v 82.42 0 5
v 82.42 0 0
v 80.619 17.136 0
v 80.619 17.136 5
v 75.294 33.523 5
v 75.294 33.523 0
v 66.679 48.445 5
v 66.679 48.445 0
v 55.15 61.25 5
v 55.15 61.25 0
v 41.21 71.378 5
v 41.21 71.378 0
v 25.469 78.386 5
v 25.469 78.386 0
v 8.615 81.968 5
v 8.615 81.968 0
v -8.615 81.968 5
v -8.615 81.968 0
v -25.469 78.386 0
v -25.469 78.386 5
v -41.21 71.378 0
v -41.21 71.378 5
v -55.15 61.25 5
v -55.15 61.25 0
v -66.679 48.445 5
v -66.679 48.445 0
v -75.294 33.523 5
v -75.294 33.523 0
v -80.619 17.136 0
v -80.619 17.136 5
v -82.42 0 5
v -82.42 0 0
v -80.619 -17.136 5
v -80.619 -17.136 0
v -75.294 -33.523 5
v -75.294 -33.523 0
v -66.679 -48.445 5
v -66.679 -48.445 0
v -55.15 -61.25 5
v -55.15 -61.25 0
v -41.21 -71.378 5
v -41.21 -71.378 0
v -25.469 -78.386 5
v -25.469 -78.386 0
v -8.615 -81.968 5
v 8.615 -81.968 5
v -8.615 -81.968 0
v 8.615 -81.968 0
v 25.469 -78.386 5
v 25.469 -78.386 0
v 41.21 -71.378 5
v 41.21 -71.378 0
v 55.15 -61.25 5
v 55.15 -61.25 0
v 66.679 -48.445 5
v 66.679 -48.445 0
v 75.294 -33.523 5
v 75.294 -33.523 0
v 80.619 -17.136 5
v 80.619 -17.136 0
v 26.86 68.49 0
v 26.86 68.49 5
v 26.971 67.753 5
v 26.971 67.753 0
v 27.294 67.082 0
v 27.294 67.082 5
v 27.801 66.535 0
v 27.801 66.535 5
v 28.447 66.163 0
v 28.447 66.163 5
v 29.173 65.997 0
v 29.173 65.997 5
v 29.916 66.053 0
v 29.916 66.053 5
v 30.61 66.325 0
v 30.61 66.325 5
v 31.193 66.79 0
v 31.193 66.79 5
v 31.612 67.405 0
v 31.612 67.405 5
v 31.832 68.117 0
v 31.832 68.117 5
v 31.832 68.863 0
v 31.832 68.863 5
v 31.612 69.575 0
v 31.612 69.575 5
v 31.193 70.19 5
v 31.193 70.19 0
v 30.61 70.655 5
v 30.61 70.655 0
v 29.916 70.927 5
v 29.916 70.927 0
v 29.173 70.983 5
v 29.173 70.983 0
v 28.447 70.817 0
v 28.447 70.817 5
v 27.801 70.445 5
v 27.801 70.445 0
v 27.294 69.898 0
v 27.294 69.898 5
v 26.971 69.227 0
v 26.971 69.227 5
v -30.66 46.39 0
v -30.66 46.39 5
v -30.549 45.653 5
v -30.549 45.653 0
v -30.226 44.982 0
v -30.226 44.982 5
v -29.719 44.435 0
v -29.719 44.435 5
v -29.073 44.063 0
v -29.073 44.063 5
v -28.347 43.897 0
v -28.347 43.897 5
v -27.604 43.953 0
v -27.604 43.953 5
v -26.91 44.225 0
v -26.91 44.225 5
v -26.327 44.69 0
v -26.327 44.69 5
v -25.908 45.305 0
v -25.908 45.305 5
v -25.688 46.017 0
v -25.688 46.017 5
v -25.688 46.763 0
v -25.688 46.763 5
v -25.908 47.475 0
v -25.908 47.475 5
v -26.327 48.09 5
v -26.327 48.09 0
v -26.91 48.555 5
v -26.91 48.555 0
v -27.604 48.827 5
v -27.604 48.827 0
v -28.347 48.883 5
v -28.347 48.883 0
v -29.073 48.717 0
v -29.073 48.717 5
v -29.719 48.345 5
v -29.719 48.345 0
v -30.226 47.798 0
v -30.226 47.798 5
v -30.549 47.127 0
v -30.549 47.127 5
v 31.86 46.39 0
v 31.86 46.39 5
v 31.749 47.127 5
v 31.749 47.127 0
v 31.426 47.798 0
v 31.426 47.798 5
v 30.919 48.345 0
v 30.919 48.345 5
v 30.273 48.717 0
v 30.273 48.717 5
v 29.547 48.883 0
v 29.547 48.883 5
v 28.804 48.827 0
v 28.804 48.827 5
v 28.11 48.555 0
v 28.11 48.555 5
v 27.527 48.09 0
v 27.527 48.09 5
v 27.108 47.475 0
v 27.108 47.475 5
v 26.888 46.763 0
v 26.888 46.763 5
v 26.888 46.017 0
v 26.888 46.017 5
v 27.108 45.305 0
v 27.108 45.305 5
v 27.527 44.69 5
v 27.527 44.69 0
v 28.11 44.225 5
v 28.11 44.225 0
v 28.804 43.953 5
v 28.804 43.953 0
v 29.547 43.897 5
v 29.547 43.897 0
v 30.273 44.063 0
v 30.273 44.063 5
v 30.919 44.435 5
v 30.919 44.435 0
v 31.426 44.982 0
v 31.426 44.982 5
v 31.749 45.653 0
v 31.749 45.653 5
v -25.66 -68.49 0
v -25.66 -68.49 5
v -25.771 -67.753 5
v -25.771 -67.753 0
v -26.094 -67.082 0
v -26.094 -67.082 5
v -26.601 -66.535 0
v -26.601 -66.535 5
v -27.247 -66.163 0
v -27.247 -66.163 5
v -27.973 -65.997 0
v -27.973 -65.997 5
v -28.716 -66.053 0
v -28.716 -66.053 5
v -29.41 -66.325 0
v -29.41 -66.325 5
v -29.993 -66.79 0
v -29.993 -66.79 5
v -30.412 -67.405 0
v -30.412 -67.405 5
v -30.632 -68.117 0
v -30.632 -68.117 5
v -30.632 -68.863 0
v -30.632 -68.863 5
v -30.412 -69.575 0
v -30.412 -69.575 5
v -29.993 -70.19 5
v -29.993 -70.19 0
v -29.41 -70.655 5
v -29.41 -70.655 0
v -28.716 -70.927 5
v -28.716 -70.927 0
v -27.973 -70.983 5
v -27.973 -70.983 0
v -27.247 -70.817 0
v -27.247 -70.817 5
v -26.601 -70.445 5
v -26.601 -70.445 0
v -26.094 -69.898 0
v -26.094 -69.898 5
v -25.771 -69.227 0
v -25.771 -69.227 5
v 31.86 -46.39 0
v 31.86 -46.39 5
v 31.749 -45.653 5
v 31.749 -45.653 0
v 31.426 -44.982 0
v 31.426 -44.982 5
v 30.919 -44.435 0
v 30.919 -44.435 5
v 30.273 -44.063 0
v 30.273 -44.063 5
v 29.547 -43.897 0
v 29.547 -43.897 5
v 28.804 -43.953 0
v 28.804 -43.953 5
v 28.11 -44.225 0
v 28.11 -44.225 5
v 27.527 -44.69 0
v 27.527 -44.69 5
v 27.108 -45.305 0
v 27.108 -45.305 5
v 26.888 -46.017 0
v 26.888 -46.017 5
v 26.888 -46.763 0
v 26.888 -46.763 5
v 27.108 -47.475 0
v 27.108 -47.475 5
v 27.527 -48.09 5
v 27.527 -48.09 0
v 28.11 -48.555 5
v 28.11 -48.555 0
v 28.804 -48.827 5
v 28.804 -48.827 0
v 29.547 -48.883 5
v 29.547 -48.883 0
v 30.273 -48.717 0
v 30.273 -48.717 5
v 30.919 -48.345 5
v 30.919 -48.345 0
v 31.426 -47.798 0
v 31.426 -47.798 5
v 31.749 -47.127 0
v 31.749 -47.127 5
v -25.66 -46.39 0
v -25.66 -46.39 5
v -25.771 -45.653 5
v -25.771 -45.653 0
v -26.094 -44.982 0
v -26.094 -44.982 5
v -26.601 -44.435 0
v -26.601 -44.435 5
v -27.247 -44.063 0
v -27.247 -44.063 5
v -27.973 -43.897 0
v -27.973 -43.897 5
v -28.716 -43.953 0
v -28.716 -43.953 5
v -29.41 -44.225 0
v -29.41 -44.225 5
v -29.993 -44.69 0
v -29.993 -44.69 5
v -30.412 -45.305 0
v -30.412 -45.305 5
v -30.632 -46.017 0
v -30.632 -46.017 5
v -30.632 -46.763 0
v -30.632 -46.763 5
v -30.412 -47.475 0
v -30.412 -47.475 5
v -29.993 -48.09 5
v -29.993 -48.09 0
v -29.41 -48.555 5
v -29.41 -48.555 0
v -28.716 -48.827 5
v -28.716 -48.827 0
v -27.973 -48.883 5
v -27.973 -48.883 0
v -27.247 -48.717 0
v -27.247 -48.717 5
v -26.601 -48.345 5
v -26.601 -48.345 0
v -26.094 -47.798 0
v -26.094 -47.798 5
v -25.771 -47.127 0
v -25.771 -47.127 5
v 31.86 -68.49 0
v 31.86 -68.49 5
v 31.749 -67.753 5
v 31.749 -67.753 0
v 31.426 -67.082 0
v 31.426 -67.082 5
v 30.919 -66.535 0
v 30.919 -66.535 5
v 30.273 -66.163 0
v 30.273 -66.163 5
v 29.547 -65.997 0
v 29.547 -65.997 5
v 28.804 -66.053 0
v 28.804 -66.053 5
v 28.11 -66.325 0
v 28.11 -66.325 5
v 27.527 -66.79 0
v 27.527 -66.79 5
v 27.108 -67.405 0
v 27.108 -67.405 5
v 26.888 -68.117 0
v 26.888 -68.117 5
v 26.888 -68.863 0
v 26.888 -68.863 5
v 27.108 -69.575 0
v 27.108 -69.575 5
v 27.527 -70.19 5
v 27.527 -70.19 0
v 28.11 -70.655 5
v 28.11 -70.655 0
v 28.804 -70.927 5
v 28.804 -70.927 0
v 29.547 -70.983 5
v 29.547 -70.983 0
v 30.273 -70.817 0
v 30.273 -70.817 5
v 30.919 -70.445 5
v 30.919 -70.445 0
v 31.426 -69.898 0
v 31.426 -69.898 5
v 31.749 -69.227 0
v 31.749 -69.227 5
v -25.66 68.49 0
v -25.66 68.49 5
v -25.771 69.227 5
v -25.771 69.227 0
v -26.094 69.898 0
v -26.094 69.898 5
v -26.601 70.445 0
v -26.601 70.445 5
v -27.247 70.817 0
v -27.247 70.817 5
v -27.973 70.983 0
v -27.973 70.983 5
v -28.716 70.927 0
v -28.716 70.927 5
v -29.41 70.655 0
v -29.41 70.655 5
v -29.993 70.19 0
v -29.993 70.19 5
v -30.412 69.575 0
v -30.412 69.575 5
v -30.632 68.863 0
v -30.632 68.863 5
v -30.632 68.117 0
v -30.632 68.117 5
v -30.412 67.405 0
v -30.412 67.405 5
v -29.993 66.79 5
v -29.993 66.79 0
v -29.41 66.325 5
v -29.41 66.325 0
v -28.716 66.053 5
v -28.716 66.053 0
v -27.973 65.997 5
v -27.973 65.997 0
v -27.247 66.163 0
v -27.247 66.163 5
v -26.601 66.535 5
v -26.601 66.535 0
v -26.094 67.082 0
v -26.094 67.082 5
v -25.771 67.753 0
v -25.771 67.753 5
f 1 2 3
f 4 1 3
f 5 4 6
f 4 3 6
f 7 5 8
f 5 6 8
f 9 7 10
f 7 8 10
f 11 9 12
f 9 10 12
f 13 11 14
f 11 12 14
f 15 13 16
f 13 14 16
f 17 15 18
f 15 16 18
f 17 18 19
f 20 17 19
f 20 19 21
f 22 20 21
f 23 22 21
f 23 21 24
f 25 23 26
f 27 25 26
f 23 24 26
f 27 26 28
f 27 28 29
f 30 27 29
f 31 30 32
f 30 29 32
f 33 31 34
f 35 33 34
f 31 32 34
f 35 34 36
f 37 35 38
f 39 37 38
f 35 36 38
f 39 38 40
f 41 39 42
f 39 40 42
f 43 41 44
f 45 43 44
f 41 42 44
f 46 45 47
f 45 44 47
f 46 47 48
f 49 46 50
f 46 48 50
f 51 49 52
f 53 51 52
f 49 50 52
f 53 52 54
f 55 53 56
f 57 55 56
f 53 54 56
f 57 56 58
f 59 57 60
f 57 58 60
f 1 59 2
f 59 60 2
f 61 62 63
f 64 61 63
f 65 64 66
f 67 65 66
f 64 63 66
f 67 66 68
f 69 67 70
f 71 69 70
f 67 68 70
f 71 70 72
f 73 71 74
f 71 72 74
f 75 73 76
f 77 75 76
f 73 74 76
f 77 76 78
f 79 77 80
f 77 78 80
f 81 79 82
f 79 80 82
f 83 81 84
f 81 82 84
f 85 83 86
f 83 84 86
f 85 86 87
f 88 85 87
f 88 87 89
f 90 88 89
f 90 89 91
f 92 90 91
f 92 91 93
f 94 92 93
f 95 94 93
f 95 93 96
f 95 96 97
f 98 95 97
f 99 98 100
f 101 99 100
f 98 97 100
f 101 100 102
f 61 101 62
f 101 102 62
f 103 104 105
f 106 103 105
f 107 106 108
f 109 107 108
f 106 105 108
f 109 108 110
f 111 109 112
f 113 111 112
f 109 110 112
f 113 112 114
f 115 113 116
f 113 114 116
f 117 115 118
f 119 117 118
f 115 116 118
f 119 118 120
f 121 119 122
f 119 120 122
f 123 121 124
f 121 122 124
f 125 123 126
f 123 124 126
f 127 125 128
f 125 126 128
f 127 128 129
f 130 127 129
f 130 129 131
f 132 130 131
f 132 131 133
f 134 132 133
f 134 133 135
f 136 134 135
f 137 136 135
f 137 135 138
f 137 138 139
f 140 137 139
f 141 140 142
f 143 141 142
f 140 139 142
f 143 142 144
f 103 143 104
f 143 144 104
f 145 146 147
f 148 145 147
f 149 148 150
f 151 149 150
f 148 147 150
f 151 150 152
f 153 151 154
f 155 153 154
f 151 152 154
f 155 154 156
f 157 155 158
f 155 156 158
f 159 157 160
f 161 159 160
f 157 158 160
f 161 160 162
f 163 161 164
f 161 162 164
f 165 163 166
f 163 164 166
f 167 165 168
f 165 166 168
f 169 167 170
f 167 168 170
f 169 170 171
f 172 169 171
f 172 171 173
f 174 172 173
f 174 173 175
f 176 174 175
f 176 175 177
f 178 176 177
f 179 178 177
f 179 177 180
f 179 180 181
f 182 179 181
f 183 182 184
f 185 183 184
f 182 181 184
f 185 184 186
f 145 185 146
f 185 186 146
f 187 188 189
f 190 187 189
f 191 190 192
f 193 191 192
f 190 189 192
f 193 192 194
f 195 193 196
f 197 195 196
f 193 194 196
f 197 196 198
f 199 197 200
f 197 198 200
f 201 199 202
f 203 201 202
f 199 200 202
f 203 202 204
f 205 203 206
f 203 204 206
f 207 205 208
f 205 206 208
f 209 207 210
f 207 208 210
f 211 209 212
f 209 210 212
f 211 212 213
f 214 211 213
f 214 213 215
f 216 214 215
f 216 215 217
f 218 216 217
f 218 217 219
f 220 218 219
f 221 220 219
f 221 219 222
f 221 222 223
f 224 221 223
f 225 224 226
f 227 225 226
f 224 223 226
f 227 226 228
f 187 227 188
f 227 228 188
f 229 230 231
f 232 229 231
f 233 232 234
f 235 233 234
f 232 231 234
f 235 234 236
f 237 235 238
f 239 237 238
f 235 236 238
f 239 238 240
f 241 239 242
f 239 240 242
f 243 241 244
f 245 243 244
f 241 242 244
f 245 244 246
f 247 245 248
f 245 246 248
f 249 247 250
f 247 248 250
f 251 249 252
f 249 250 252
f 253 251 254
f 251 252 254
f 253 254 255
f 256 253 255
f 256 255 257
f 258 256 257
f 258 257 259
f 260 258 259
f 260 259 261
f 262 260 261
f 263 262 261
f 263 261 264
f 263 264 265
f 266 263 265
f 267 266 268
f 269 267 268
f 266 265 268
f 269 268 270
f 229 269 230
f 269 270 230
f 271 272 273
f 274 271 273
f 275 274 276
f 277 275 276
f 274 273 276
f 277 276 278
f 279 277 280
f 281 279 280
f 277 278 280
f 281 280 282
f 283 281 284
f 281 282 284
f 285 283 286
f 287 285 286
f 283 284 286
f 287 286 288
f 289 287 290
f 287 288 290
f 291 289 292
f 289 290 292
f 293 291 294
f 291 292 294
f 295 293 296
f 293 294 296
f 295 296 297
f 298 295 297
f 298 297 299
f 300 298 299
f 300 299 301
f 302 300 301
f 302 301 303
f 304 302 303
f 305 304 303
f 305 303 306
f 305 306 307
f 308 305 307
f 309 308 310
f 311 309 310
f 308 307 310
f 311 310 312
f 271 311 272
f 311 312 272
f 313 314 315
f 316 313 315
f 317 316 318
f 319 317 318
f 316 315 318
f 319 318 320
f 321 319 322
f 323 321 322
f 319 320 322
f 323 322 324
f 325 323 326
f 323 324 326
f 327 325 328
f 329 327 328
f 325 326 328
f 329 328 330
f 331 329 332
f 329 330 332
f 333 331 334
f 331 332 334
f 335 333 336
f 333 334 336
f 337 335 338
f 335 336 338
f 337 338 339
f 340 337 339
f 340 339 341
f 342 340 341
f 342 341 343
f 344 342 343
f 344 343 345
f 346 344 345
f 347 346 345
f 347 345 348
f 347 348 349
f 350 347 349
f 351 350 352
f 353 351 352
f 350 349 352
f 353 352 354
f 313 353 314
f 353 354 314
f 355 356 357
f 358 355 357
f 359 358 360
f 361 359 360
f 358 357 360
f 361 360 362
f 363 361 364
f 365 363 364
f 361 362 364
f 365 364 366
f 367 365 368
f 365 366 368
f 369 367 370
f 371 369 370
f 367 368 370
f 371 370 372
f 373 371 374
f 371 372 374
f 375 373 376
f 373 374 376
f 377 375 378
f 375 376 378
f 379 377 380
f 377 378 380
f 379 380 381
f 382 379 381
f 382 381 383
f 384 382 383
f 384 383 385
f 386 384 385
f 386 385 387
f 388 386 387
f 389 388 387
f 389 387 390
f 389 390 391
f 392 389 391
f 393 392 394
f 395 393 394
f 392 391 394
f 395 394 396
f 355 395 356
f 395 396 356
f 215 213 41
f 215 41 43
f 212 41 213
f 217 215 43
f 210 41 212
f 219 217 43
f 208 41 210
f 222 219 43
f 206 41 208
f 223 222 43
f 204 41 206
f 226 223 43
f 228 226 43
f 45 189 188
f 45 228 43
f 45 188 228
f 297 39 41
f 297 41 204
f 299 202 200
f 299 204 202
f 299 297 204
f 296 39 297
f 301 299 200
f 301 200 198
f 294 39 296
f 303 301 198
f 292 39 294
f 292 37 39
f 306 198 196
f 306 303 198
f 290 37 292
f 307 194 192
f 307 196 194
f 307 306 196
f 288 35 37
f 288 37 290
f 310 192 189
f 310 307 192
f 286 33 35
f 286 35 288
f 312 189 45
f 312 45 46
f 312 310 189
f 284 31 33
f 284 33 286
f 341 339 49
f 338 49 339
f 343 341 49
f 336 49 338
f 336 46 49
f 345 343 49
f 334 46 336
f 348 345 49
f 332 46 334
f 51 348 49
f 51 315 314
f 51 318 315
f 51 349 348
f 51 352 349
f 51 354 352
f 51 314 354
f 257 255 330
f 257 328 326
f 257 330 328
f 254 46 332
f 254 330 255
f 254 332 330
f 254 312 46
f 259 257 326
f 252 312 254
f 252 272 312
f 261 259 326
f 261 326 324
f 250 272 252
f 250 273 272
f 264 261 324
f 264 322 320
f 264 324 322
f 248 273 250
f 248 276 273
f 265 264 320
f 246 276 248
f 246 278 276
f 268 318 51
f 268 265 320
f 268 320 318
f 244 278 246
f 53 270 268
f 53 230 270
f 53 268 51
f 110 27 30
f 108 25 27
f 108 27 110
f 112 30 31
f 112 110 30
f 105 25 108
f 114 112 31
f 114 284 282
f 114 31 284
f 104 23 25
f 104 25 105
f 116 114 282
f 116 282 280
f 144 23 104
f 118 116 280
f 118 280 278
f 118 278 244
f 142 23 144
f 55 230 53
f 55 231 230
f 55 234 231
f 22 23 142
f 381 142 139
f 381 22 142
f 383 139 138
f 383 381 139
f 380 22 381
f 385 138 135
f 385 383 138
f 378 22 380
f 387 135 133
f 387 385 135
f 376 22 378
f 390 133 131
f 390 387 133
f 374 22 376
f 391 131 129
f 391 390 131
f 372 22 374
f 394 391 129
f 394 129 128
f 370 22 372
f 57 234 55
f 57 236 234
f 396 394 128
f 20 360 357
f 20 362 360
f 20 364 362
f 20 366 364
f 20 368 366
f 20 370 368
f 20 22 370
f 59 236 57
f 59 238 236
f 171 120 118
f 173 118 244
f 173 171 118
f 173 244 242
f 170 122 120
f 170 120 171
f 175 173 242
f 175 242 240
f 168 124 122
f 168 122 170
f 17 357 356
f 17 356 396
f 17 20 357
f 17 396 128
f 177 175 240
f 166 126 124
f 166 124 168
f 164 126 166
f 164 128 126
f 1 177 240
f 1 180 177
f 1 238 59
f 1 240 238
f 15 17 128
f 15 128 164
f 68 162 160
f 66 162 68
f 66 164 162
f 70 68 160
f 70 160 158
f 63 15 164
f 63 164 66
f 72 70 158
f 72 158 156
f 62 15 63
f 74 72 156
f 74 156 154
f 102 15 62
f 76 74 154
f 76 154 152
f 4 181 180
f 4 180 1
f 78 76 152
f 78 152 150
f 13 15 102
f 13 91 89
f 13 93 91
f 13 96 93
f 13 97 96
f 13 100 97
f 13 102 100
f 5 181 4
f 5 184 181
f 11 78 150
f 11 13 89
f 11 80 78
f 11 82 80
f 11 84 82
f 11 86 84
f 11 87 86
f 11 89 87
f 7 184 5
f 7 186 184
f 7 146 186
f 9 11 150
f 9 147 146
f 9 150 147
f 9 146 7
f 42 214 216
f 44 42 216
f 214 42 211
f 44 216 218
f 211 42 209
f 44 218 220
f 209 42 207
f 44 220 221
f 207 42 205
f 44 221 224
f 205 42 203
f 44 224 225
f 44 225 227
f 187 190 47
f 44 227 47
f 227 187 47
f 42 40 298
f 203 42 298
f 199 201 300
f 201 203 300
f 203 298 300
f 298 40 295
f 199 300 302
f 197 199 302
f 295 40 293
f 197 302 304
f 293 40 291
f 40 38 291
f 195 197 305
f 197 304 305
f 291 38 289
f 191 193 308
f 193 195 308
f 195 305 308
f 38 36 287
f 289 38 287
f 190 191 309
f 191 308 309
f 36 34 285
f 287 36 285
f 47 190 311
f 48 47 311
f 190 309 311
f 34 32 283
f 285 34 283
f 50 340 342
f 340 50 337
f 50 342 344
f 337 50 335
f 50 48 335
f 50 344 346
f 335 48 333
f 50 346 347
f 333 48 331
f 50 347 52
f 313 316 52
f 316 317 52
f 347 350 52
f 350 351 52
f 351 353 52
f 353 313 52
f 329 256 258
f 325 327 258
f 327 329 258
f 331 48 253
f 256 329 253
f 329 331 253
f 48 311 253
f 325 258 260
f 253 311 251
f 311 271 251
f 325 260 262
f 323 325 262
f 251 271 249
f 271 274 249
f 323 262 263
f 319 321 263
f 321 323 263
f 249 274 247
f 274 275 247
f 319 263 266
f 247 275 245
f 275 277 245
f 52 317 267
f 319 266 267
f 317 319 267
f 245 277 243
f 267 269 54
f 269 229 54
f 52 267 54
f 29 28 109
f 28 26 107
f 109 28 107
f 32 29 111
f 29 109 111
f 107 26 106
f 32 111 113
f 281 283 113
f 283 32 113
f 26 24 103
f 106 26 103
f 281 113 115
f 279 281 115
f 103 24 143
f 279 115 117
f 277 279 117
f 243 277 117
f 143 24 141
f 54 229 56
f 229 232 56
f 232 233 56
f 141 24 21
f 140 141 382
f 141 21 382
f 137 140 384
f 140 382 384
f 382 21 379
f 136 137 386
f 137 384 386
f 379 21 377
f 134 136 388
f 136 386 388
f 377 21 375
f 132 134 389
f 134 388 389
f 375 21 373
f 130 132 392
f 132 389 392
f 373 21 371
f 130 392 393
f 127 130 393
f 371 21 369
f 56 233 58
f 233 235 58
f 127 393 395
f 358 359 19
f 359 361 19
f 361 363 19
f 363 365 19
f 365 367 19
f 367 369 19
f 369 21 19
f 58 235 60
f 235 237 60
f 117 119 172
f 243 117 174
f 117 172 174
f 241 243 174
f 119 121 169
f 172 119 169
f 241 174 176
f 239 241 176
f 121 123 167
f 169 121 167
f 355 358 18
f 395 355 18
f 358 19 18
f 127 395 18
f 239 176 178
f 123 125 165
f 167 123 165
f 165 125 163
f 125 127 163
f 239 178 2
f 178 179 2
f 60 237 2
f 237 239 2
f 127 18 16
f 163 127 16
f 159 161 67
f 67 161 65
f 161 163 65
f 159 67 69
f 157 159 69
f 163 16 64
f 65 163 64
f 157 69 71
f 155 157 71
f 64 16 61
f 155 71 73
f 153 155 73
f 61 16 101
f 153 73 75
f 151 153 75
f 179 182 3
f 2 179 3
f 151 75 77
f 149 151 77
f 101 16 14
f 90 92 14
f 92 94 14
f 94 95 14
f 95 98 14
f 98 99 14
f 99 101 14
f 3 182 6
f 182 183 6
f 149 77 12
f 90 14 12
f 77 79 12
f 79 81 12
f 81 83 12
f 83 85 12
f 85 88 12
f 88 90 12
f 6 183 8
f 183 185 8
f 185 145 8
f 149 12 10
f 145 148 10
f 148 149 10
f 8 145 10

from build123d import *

# Parameters (mm, degrees)
CROQUIS1_R              = 82.42
SALIENTE_EXTRUIR1_DEPTH = 5
CROQUIS3_R              = 2.5
CORTAR_EXTRUIR1_DEPTH   = 5


with BuildPart() as part:
    # Croquis1 → Saliente-Extruir1 (new body)
    with BuildSketch(Plane.XY):
        Circle(CROQUIS1_R)
    extrude(amount=SALIENTE_EXTRUIR1_DEPTH)

    # Croquis3 → Cortar-Extruir1 (cut, symmetric)
    with BuildSketch(Plane.XY.offset(5)):
        with Locations((29.36, 46.39)):
            Circle(CROQUIS3_R)
        with Locations((-28.16, 68.49)):
            Circle(CROQUIS3_R)
        with Locations((29.36, -46.39)):
            Circle(CROQUIS3_R)
        with Locations((-28.16, -46.39)):
            Circle(CROQUIS3_R)
        with Locations((29.36, -68.49)):
            Circle(CROQUIS3_R)
        with Locations(Location((29.36, 68.49, 0), (0, 0, 180))):
            Circle(CROQUIS3_R)
        with Locations(Location((-28.16, 46.39, 0), (0, 0, 180))):
            Circle(CROQUIS3_R)
        with Locations((-28.16, -68.49)):
            Circle(CROQUIS3_R)
    extrude(amount=CORTAR_EXTRUIR1_DEPTH, both=True, mode=Mode.SUBTRACT)


solid = part.part
